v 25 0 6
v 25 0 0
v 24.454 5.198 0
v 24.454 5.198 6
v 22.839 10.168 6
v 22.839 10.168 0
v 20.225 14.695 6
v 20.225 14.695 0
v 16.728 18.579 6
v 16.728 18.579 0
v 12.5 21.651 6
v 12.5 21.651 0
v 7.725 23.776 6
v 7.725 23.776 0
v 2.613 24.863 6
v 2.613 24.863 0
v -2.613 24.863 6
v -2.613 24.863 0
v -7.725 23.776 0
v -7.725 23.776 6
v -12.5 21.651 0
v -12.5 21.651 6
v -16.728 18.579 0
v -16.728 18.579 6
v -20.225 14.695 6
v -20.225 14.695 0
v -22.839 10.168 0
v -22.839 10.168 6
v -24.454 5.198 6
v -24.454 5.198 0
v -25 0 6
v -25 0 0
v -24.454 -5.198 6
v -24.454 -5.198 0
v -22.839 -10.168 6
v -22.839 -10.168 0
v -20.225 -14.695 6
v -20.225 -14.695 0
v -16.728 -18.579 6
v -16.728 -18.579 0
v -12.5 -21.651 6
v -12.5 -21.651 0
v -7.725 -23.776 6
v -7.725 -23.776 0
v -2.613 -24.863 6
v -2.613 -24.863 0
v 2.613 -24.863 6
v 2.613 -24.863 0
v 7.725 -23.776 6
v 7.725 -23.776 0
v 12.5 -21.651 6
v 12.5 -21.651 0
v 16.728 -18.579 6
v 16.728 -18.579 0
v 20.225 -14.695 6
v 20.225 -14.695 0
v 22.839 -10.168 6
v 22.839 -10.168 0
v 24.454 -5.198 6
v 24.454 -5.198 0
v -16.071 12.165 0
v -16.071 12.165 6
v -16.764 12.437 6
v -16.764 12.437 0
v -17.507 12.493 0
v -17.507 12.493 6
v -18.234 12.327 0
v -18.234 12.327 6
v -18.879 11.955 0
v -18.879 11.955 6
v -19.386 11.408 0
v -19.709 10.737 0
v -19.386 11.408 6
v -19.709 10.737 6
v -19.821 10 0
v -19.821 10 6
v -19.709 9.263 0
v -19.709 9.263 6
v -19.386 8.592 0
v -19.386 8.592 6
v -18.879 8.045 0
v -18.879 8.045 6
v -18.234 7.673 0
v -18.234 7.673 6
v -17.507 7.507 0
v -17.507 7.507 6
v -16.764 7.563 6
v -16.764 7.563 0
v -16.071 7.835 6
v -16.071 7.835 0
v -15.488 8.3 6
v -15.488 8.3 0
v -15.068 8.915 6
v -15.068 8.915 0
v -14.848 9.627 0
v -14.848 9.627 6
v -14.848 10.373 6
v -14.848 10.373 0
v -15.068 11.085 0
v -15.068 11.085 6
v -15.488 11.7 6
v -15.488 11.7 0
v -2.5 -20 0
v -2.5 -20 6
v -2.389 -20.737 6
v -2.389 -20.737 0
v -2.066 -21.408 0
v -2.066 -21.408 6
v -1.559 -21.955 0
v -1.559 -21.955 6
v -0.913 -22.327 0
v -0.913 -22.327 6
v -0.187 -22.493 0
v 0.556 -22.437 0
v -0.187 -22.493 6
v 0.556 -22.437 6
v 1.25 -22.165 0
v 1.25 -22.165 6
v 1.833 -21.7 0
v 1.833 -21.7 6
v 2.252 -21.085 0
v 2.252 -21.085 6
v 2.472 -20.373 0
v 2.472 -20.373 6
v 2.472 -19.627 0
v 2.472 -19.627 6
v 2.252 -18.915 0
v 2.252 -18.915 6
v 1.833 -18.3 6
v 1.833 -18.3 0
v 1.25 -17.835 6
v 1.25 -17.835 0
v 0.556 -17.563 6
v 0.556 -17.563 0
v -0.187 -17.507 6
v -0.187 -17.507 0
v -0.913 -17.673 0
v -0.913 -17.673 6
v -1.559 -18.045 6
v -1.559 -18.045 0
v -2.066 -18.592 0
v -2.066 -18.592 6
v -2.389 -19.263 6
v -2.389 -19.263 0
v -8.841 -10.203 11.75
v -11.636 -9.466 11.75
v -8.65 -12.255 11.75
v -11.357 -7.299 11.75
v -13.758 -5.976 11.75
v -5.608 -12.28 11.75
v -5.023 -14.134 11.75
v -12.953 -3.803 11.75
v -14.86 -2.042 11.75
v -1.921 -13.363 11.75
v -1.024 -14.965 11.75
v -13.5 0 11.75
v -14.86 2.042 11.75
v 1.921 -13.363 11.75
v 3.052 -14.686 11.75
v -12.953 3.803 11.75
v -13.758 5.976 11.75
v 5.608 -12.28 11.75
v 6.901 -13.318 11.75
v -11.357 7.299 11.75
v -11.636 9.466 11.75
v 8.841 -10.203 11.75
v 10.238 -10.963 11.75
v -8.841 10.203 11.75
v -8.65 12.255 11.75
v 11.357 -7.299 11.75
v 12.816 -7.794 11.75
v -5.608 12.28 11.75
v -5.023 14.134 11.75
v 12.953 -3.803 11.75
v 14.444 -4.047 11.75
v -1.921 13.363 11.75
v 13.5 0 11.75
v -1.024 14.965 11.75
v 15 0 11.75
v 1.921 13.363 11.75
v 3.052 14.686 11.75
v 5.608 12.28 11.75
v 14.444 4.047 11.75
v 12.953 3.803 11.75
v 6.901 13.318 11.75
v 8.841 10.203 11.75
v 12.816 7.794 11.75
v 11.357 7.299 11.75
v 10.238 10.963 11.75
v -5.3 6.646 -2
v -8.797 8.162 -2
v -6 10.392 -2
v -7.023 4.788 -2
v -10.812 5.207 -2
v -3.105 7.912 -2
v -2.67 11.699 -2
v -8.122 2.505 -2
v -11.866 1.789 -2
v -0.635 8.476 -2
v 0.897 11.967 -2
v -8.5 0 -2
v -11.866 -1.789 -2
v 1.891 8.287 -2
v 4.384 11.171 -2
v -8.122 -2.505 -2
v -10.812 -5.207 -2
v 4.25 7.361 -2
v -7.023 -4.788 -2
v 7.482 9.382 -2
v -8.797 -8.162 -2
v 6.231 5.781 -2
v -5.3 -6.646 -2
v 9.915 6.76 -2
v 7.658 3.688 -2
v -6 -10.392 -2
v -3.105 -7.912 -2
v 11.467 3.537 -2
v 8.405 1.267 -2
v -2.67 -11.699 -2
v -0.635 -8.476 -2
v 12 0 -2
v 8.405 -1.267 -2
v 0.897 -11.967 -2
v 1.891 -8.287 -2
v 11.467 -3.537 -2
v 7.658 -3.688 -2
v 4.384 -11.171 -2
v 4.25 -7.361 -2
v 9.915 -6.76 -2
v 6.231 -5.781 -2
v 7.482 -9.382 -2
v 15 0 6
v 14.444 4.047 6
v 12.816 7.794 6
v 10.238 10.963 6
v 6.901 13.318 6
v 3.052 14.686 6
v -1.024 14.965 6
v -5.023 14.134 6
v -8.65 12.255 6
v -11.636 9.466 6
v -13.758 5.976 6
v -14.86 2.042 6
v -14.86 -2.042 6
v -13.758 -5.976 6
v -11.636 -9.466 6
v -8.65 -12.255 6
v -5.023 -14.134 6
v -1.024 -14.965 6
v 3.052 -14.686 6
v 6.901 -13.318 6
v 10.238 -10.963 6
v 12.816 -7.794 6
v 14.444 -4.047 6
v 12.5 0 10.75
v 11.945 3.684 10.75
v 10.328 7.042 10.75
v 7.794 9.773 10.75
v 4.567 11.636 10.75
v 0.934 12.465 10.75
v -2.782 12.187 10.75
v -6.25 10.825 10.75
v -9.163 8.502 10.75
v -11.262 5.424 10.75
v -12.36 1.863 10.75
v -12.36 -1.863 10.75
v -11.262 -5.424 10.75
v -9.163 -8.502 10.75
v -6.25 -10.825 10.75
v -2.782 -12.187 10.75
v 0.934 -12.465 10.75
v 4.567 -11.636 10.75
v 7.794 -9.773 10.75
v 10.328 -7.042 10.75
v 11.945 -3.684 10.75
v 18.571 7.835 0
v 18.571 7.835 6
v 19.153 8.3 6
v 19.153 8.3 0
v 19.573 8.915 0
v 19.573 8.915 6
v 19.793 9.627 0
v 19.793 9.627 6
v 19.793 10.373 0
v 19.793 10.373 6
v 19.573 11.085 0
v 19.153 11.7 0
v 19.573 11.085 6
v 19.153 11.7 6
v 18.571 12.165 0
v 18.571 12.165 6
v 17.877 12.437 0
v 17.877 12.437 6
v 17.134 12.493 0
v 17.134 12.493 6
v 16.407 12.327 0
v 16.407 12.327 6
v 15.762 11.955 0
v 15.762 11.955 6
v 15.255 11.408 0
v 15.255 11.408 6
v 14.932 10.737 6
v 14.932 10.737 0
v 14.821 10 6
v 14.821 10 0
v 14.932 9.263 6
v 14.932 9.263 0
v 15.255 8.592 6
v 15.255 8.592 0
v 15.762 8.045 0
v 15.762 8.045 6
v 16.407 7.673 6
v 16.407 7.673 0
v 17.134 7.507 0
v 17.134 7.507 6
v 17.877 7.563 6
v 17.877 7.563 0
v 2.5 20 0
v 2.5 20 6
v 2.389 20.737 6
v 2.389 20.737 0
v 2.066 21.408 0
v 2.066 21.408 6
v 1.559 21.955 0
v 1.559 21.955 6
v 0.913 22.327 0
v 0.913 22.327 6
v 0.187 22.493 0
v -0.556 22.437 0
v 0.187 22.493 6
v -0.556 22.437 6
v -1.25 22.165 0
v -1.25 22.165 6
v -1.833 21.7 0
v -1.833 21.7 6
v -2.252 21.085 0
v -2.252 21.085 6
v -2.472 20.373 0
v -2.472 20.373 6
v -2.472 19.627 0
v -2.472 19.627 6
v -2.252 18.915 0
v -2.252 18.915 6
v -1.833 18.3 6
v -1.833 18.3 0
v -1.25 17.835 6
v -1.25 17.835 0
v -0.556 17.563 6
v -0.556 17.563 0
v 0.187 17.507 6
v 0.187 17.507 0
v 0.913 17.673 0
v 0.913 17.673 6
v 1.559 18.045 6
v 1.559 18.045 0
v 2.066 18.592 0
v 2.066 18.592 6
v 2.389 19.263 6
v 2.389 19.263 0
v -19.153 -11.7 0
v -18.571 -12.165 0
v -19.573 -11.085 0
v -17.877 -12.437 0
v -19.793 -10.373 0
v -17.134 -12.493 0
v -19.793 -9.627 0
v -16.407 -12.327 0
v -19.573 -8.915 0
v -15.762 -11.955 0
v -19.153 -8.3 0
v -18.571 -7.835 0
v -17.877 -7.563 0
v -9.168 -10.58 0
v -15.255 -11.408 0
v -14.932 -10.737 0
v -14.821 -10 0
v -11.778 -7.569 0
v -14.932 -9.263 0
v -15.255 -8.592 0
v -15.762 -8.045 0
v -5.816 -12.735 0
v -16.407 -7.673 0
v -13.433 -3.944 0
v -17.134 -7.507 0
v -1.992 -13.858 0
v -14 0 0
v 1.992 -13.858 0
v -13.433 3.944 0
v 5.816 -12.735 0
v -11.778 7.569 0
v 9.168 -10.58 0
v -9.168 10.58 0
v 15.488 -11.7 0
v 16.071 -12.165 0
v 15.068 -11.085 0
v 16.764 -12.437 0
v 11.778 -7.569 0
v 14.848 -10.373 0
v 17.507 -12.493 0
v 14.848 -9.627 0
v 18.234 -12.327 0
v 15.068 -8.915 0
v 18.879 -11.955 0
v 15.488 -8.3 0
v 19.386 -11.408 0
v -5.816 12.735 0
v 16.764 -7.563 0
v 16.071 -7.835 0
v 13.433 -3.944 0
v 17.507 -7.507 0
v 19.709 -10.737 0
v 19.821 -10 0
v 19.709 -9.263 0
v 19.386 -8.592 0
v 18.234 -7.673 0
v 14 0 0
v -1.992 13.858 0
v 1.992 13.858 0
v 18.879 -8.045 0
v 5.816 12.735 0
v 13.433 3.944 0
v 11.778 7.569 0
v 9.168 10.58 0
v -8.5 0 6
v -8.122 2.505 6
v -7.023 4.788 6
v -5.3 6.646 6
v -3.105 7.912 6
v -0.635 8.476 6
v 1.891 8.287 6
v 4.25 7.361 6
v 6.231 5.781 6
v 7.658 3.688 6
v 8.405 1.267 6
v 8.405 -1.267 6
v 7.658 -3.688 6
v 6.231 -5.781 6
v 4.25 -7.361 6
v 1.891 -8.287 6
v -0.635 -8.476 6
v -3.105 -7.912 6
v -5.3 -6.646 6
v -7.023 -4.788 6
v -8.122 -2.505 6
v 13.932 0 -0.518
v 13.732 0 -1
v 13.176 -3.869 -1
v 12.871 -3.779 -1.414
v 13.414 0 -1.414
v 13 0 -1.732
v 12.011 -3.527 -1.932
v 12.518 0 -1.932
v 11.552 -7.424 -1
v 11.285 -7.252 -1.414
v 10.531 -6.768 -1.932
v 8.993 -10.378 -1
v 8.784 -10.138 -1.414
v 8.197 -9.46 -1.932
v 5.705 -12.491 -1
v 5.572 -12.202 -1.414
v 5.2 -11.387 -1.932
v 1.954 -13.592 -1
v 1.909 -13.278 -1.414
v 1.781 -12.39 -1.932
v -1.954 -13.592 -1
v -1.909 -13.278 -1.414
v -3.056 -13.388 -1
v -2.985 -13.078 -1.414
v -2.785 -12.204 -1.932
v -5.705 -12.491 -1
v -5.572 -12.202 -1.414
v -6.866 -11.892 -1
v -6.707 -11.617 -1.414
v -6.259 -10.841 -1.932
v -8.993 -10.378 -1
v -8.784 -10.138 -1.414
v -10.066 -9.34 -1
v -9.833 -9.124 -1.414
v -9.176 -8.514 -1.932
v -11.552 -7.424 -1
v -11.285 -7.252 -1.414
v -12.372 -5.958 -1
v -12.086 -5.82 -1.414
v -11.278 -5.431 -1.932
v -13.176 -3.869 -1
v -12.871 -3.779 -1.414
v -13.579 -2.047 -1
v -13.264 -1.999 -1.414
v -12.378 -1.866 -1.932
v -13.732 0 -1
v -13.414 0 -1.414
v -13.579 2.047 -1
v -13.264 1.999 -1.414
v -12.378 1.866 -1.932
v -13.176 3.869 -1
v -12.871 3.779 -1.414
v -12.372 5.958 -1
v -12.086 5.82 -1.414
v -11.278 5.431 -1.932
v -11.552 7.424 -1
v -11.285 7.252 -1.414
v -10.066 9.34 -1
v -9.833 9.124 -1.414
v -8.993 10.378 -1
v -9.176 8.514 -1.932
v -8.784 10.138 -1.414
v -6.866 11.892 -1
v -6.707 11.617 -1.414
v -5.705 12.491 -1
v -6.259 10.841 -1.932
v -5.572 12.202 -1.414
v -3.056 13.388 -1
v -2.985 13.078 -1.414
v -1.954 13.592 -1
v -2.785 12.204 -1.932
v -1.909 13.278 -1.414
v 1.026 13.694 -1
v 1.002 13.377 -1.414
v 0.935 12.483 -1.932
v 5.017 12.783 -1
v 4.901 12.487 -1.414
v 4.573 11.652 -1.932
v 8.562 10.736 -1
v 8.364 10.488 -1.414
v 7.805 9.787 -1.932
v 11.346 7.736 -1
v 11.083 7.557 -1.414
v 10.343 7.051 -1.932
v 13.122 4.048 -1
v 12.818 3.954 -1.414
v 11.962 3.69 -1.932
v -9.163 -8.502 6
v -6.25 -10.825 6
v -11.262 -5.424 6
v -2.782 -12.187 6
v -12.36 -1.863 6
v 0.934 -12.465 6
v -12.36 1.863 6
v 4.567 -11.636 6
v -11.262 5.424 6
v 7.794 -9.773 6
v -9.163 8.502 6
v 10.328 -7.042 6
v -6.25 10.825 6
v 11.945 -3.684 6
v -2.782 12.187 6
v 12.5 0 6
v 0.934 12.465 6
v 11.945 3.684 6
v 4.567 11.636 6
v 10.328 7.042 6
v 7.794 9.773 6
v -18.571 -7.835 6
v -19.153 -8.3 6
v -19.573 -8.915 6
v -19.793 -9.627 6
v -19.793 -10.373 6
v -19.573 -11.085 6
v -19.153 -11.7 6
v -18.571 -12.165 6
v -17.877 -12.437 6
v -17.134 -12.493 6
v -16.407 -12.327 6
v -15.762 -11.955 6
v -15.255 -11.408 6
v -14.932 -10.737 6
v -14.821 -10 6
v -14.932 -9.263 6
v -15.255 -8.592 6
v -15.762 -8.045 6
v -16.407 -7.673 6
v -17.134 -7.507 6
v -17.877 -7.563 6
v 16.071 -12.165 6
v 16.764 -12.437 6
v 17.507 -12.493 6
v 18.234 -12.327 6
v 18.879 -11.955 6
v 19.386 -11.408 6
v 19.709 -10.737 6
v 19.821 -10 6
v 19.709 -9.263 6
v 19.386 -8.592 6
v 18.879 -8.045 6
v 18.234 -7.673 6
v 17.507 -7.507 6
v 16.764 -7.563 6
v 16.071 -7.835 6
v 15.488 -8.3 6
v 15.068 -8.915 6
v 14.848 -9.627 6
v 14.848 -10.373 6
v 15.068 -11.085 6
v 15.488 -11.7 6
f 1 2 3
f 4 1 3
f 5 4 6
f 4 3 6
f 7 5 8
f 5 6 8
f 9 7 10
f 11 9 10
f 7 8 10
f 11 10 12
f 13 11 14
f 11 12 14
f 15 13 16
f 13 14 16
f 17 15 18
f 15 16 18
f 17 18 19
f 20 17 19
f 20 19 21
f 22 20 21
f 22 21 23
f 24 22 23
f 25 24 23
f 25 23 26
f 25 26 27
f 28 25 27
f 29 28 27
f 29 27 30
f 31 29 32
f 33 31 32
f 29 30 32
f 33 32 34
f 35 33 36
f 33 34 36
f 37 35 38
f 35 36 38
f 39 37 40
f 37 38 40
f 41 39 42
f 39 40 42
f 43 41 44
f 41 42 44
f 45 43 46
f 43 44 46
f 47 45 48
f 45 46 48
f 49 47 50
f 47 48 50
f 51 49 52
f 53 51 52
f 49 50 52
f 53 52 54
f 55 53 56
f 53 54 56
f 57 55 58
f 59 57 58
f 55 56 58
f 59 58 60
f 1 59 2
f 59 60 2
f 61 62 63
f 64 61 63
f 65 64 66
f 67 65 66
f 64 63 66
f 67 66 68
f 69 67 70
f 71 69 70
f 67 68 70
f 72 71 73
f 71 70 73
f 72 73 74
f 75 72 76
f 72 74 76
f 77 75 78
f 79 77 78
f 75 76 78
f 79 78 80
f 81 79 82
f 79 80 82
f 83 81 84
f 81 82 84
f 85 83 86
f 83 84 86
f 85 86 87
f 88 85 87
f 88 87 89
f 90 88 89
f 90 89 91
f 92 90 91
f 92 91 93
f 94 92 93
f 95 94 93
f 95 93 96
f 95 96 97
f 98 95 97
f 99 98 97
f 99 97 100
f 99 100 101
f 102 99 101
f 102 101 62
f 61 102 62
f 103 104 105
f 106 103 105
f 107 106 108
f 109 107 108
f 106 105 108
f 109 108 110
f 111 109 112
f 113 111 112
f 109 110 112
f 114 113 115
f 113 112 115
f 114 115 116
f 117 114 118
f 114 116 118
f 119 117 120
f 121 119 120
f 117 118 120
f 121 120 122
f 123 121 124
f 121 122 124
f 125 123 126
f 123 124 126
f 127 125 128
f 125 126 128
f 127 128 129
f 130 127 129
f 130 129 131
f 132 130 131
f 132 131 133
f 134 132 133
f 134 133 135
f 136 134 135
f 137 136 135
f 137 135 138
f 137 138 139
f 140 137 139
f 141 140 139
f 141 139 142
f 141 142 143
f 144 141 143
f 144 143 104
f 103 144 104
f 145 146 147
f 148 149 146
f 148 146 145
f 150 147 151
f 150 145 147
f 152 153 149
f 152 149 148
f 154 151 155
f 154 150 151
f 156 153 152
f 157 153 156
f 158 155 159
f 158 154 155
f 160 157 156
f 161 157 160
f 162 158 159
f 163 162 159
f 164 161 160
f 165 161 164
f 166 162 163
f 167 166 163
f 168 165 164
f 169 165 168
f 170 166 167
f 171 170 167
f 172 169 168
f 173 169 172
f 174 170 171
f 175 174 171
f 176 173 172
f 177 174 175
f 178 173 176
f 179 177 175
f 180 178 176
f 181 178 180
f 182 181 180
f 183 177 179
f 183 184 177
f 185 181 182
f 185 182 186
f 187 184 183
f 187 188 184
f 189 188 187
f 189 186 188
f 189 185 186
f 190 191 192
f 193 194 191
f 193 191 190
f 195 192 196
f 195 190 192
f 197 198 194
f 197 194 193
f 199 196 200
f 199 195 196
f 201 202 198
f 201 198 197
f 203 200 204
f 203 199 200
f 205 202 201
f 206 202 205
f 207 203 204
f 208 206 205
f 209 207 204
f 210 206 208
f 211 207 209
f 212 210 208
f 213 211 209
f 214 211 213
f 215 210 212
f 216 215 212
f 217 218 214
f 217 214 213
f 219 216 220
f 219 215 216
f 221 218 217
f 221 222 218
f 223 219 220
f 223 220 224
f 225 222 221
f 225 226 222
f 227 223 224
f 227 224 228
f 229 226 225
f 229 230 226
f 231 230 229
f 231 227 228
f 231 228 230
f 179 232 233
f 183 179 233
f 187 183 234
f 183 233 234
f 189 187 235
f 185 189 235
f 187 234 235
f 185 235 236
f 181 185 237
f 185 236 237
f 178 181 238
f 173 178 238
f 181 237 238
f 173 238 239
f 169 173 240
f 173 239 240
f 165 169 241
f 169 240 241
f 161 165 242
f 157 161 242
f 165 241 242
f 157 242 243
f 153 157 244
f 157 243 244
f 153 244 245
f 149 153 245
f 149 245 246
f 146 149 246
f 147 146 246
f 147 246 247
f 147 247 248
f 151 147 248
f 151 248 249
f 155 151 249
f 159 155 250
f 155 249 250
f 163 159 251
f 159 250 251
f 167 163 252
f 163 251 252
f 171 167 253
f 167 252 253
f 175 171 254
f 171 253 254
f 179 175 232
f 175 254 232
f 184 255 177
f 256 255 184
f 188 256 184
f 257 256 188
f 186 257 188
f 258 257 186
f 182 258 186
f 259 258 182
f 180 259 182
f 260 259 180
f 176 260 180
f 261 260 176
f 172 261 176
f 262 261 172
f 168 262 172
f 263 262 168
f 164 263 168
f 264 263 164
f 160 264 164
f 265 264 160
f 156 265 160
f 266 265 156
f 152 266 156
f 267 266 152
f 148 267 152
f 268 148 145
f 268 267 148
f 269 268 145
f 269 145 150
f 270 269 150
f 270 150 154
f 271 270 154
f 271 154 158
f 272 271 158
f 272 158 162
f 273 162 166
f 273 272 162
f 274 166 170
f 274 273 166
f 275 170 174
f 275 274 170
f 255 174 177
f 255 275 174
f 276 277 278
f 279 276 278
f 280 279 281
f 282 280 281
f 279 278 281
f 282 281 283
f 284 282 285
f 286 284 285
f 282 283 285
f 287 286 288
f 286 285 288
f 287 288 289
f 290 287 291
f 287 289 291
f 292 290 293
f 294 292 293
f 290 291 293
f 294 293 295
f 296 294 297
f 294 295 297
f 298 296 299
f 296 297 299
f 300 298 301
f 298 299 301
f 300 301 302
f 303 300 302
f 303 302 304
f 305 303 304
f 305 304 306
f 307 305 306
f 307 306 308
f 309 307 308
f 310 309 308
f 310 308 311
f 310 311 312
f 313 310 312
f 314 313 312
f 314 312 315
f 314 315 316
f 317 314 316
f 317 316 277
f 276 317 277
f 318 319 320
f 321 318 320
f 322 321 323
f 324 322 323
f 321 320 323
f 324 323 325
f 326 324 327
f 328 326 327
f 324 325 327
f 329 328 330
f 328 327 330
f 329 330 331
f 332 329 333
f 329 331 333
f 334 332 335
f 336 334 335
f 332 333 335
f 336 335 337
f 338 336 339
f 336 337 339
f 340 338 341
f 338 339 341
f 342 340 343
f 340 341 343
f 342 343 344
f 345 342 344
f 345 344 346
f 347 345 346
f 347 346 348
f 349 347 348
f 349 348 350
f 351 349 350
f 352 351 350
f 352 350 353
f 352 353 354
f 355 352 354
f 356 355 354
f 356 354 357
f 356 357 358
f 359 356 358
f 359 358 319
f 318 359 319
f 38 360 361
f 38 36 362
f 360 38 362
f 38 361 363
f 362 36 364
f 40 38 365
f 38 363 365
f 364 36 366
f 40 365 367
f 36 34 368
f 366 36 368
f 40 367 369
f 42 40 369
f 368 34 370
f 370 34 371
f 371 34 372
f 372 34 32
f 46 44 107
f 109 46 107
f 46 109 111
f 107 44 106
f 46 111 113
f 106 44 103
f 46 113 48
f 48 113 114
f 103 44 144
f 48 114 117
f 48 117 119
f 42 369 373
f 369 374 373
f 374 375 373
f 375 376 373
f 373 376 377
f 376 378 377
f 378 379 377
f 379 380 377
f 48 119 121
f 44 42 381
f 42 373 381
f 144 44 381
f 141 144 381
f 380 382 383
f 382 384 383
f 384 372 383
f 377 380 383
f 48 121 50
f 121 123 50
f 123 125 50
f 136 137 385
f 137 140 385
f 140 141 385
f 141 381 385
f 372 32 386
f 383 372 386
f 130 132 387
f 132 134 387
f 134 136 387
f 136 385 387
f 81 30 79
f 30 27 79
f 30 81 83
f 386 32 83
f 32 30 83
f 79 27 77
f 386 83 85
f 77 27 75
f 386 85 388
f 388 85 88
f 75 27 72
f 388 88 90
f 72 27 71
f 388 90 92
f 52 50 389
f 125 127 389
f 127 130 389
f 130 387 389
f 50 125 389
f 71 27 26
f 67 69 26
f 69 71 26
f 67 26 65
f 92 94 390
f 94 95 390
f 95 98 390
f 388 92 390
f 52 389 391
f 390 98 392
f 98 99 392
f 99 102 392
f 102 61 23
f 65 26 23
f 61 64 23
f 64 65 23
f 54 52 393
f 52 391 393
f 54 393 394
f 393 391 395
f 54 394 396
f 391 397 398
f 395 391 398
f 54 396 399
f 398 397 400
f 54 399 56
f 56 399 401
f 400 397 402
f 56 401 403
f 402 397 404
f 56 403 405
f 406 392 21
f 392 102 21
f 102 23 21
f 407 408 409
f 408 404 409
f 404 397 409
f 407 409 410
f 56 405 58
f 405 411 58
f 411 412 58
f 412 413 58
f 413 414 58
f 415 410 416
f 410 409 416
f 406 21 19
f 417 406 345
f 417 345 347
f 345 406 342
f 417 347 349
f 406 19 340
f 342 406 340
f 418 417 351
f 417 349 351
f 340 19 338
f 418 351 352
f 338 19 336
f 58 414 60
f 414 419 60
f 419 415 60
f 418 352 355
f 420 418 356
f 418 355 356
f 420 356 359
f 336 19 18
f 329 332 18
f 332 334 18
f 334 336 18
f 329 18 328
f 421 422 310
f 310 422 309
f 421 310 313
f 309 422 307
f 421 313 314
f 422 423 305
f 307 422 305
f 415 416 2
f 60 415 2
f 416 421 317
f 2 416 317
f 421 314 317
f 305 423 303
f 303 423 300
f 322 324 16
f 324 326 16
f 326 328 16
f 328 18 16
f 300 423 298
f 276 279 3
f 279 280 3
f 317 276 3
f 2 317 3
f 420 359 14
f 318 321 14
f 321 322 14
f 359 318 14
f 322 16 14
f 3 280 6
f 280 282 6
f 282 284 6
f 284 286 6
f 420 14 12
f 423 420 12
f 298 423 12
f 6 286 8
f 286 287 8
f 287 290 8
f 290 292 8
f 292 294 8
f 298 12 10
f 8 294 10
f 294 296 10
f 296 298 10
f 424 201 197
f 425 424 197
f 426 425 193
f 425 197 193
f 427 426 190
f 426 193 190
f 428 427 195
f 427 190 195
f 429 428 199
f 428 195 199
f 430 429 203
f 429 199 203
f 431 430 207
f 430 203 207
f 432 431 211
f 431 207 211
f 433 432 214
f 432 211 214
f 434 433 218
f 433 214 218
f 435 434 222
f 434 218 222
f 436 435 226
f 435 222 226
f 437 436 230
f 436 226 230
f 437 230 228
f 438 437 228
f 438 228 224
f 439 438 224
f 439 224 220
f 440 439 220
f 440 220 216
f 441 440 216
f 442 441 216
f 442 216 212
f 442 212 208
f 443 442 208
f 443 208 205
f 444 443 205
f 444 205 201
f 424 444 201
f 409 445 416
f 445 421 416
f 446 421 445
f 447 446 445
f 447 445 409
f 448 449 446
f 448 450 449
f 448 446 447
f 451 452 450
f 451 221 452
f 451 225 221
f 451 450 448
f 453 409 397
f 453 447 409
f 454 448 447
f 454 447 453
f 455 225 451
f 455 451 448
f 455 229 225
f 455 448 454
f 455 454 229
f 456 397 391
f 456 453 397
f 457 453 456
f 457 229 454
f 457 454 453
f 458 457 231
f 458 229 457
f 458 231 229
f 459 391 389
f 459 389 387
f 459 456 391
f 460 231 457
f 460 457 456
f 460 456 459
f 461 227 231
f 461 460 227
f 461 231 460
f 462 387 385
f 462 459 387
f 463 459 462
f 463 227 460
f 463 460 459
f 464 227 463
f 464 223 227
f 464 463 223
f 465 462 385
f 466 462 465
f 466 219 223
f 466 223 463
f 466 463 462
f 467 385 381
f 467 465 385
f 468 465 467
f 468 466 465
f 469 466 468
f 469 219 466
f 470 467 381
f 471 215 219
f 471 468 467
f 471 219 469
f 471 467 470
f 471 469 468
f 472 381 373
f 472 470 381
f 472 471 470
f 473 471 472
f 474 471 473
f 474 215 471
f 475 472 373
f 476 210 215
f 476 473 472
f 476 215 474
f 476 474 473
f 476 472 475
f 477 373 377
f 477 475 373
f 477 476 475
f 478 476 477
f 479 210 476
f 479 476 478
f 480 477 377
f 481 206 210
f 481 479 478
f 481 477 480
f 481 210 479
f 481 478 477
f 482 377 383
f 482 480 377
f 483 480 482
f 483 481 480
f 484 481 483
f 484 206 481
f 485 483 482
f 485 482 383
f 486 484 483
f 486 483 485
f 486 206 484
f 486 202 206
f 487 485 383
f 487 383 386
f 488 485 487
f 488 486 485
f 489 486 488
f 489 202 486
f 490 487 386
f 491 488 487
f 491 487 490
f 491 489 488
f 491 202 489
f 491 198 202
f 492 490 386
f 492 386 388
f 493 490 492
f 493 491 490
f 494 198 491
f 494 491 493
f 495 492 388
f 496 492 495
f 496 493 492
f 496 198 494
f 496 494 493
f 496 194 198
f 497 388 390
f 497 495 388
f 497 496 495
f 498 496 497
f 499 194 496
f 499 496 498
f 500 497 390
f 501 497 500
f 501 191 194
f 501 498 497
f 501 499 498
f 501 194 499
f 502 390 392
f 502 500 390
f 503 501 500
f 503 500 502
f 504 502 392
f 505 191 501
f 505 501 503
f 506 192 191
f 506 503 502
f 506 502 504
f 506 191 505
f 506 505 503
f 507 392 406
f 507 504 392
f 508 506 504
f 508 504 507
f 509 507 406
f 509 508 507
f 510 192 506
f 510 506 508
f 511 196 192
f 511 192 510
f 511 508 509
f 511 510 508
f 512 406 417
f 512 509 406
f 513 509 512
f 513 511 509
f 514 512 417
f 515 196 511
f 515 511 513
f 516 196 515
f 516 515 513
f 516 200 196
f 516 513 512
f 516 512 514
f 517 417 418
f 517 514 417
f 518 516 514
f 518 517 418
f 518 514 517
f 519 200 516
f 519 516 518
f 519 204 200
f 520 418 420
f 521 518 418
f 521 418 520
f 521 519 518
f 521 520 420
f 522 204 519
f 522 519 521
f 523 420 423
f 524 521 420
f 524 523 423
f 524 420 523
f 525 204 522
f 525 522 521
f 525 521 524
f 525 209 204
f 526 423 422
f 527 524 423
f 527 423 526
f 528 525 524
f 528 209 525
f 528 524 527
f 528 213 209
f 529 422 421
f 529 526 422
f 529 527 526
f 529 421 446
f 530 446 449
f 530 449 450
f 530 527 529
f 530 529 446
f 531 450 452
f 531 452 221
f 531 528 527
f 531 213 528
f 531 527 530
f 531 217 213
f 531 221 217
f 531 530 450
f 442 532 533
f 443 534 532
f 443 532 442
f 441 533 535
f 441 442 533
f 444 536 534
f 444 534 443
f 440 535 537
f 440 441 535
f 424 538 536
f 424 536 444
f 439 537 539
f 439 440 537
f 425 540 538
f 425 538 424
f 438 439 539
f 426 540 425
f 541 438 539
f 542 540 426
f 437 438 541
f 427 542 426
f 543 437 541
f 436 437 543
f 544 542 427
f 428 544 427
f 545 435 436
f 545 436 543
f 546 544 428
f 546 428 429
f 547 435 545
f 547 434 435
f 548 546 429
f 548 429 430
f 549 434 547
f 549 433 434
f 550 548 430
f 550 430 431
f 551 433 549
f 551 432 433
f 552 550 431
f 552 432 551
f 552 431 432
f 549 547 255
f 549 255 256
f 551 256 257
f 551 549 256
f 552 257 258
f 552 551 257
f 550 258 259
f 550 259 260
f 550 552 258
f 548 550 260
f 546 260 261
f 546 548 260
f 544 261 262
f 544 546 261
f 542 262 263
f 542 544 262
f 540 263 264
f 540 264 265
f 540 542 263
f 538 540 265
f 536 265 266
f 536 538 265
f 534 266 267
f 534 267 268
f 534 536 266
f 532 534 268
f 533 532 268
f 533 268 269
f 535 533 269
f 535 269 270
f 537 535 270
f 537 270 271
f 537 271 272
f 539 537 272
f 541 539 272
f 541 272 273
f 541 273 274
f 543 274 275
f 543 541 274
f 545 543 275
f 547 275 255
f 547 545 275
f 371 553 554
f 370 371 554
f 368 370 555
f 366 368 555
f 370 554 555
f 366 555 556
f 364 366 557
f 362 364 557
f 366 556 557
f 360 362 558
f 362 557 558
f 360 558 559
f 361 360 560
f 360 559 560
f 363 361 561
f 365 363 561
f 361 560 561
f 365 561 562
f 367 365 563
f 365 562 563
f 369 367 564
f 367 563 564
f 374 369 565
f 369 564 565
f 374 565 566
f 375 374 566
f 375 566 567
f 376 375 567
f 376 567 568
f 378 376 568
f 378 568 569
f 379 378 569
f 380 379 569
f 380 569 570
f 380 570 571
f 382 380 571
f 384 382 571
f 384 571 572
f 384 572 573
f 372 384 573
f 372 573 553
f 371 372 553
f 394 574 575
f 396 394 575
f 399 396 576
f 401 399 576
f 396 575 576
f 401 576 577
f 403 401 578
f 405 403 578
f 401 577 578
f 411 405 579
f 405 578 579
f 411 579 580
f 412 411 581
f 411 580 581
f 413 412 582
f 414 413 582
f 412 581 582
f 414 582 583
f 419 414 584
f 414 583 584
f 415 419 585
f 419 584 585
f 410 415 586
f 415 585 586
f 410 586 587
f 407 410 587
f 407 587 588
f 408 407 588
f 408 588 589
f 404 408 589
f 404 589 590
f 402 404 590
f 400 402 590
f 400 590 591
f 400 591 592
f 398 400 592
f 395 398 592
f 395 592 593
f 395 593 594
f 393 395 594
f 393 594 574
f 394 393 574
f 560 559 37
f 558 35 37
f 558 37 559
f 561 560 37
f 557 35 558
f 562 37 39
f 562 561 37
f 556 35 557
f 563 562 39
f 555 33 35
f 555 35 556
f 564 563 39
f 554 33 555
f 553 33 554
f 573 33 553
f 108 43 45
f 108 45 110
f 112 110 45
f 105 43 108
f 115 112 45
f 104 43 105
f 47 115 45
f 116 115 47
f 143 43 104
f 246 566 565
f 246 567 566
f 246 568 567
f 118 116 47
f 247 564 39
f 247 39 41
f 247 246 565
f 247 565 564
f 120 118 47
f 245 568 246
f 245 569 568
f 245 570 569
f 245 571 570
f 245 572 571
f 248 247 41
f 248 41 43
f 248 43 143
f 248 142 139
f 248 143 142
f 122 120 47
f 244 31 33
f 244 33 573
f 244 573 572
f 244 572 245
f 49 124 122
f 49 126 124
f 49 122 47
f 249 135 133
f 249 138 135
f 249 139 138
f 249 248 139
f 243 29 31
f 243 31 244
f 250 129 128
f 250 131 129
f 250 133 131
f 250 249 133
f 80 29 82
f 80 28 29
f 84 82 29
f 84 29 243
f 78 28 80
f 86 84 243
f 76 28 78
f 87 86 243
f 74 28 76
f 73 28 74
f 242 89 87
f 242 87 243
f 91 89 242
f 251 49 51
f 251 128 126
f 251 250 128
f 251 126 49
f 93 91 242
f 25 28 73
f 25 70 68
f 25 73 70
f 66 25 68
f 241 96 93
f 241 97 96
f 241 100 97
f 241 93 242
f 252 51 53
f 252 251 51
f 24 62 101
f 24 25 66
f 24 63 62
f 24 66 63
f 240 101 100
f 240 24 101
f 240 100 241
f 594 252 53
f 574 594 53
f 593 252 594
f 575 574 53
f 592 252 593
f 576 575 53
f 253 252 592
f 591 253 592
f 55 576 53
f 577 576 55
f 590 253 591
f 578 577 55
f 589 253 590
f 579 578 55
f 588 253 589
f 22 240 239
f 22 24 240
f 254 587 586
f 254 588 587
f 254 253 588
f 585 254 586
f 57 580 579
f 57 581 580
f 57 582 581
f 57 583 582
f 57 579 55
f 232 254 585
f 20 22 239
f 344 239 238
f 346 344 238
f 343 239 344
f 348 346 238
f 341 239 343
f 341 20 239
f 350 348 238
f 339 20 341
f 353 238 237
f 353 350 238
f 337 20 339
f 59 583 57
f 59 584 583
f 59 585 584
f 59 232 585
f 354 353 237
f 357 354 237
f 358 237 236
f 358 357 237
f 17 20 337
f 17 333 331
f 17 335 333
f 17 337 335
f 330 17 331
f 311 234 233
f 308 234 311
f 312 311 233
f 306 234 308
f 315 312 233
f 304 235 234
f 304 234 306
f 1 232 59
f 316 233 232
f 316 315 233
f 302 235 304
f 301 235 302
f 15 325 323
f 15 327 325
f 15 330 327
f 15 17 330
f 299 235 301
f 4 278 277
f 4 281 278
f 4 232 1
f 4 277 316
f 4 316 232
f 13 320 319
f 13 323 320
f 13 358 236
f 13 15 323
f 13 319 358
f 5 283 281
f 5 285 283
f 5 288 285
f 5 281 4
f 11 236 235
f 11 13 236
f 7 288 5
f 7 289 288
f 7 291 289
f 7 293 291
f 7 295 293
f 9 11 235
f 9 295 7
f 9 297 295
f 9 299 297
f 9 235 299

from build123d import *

# Parameters (mm, degrees)
SKETCH1_R                = 25
BOSS_EXTRUDE1_DEPTH      = 6
SKETCH2_R                = 15
SKETCH2_R_2              = 12.5
BOSS_EXTRUDE2_DEPTH      = 5.75
SKETCH3_R                = 14
BOSS_EXTRUDE3_DEPTH      = 2
FILLET1_R                = 2
CHAMFER1_SIZE            = 1
F_5_0_5_DIAMETER_HOLE1_D = 5
CIRPATTERN1_COUNT        = 6
SKETCH10_R               = 8.5
CUT_EXTRUDE1_DEPTH       = 38.934977264


with BuildPart() as part:
    # Sketch1 → Boss-Extrude1 (new body)
    with BuildSketch(Plane.XY):
        Circle(SKETCH1_R)
    extrude(amount=BOSS_EXTRUDE1_DEPTH)

    # Sketch2 → Boss-Extrude2 (add)
    with BuildSketch(Plane.XY.offset(6)):
        Circle(SKETCH2_R)
        Circle(SKETCH2_R_2, mode=Mode.SUBTRACT)
    extrude(amount=BOSS_EXTRUDE2_DEPTH)

    # Sketch3 → Boss-Extrude3 (add)
    with BuildSketch(Plane(origin=(0, 0, 0), x_dir=(-1, 0, 0), z_dir=(0, 0, -1))):
        with Locations(Location((0, 0, 0), (0, 0, 180))):
            Circle(SKETCH3_R)
    extrude(amount=BOSS_EXTRUDE3_DEPTH)

    # Fillet1
    fillet1_edges = [part.edges().sort_by_distance(p)[0] for p in [
        (-14, 0, -2),
    ]]
    fillet(fillet1_edges, radius=FILLET1_R - 0.0001)  # a hair under: the kernel refuses the full size

    # Chamfer1
    chamfer1_edges = [part.edges().sort_by_distance(p)[0] for p in [
        (-12.5, 0, 11.75),
    ]]
    chamfer(chamfer1_edges, length=CHAMFER1_SIZE)

    # Ø5.0 (5) Diameter Hole1 (through all)
    with Locations(Plane(origin=(0, 0, 0), x_dir=(-1, 0, 0), z_dir=(0, 0, -1))):
        with Locations((0, 20)):
            f_5_0_5_diameter_hole1 = Hole(F_5_0_5_DIAMETER_HOLE1_D / 2)

    # CirPattern1: Ø5.0 (5) Diameter Hole1 ×6 about axis
    cirpattern1_axis = Axis((0, 0, 0), (0, 0, 1))
    for i in range(1, CIRPATTERN1_COUNT):
        add(f_5_0_5_diameter_hole1.rotate(cirpattern1_axis, i * 360 / CIRPATTERN1_COUNT), mode=Mode.SUBTRACT)

    # Sketch10 → Cut-Extrude1 (cut, through all)
    with BuildSketch(Plane(origin=(0, 0, -2), x_dir=(-1, 0, 0), z_dir=(0, 0, -1))):
        Circle(SKETCH10_R)
    extrude(amount=-CUT_EXTRUDE1_DEPTH, mode=Mode.SUBTRACT)


solid = part.part
